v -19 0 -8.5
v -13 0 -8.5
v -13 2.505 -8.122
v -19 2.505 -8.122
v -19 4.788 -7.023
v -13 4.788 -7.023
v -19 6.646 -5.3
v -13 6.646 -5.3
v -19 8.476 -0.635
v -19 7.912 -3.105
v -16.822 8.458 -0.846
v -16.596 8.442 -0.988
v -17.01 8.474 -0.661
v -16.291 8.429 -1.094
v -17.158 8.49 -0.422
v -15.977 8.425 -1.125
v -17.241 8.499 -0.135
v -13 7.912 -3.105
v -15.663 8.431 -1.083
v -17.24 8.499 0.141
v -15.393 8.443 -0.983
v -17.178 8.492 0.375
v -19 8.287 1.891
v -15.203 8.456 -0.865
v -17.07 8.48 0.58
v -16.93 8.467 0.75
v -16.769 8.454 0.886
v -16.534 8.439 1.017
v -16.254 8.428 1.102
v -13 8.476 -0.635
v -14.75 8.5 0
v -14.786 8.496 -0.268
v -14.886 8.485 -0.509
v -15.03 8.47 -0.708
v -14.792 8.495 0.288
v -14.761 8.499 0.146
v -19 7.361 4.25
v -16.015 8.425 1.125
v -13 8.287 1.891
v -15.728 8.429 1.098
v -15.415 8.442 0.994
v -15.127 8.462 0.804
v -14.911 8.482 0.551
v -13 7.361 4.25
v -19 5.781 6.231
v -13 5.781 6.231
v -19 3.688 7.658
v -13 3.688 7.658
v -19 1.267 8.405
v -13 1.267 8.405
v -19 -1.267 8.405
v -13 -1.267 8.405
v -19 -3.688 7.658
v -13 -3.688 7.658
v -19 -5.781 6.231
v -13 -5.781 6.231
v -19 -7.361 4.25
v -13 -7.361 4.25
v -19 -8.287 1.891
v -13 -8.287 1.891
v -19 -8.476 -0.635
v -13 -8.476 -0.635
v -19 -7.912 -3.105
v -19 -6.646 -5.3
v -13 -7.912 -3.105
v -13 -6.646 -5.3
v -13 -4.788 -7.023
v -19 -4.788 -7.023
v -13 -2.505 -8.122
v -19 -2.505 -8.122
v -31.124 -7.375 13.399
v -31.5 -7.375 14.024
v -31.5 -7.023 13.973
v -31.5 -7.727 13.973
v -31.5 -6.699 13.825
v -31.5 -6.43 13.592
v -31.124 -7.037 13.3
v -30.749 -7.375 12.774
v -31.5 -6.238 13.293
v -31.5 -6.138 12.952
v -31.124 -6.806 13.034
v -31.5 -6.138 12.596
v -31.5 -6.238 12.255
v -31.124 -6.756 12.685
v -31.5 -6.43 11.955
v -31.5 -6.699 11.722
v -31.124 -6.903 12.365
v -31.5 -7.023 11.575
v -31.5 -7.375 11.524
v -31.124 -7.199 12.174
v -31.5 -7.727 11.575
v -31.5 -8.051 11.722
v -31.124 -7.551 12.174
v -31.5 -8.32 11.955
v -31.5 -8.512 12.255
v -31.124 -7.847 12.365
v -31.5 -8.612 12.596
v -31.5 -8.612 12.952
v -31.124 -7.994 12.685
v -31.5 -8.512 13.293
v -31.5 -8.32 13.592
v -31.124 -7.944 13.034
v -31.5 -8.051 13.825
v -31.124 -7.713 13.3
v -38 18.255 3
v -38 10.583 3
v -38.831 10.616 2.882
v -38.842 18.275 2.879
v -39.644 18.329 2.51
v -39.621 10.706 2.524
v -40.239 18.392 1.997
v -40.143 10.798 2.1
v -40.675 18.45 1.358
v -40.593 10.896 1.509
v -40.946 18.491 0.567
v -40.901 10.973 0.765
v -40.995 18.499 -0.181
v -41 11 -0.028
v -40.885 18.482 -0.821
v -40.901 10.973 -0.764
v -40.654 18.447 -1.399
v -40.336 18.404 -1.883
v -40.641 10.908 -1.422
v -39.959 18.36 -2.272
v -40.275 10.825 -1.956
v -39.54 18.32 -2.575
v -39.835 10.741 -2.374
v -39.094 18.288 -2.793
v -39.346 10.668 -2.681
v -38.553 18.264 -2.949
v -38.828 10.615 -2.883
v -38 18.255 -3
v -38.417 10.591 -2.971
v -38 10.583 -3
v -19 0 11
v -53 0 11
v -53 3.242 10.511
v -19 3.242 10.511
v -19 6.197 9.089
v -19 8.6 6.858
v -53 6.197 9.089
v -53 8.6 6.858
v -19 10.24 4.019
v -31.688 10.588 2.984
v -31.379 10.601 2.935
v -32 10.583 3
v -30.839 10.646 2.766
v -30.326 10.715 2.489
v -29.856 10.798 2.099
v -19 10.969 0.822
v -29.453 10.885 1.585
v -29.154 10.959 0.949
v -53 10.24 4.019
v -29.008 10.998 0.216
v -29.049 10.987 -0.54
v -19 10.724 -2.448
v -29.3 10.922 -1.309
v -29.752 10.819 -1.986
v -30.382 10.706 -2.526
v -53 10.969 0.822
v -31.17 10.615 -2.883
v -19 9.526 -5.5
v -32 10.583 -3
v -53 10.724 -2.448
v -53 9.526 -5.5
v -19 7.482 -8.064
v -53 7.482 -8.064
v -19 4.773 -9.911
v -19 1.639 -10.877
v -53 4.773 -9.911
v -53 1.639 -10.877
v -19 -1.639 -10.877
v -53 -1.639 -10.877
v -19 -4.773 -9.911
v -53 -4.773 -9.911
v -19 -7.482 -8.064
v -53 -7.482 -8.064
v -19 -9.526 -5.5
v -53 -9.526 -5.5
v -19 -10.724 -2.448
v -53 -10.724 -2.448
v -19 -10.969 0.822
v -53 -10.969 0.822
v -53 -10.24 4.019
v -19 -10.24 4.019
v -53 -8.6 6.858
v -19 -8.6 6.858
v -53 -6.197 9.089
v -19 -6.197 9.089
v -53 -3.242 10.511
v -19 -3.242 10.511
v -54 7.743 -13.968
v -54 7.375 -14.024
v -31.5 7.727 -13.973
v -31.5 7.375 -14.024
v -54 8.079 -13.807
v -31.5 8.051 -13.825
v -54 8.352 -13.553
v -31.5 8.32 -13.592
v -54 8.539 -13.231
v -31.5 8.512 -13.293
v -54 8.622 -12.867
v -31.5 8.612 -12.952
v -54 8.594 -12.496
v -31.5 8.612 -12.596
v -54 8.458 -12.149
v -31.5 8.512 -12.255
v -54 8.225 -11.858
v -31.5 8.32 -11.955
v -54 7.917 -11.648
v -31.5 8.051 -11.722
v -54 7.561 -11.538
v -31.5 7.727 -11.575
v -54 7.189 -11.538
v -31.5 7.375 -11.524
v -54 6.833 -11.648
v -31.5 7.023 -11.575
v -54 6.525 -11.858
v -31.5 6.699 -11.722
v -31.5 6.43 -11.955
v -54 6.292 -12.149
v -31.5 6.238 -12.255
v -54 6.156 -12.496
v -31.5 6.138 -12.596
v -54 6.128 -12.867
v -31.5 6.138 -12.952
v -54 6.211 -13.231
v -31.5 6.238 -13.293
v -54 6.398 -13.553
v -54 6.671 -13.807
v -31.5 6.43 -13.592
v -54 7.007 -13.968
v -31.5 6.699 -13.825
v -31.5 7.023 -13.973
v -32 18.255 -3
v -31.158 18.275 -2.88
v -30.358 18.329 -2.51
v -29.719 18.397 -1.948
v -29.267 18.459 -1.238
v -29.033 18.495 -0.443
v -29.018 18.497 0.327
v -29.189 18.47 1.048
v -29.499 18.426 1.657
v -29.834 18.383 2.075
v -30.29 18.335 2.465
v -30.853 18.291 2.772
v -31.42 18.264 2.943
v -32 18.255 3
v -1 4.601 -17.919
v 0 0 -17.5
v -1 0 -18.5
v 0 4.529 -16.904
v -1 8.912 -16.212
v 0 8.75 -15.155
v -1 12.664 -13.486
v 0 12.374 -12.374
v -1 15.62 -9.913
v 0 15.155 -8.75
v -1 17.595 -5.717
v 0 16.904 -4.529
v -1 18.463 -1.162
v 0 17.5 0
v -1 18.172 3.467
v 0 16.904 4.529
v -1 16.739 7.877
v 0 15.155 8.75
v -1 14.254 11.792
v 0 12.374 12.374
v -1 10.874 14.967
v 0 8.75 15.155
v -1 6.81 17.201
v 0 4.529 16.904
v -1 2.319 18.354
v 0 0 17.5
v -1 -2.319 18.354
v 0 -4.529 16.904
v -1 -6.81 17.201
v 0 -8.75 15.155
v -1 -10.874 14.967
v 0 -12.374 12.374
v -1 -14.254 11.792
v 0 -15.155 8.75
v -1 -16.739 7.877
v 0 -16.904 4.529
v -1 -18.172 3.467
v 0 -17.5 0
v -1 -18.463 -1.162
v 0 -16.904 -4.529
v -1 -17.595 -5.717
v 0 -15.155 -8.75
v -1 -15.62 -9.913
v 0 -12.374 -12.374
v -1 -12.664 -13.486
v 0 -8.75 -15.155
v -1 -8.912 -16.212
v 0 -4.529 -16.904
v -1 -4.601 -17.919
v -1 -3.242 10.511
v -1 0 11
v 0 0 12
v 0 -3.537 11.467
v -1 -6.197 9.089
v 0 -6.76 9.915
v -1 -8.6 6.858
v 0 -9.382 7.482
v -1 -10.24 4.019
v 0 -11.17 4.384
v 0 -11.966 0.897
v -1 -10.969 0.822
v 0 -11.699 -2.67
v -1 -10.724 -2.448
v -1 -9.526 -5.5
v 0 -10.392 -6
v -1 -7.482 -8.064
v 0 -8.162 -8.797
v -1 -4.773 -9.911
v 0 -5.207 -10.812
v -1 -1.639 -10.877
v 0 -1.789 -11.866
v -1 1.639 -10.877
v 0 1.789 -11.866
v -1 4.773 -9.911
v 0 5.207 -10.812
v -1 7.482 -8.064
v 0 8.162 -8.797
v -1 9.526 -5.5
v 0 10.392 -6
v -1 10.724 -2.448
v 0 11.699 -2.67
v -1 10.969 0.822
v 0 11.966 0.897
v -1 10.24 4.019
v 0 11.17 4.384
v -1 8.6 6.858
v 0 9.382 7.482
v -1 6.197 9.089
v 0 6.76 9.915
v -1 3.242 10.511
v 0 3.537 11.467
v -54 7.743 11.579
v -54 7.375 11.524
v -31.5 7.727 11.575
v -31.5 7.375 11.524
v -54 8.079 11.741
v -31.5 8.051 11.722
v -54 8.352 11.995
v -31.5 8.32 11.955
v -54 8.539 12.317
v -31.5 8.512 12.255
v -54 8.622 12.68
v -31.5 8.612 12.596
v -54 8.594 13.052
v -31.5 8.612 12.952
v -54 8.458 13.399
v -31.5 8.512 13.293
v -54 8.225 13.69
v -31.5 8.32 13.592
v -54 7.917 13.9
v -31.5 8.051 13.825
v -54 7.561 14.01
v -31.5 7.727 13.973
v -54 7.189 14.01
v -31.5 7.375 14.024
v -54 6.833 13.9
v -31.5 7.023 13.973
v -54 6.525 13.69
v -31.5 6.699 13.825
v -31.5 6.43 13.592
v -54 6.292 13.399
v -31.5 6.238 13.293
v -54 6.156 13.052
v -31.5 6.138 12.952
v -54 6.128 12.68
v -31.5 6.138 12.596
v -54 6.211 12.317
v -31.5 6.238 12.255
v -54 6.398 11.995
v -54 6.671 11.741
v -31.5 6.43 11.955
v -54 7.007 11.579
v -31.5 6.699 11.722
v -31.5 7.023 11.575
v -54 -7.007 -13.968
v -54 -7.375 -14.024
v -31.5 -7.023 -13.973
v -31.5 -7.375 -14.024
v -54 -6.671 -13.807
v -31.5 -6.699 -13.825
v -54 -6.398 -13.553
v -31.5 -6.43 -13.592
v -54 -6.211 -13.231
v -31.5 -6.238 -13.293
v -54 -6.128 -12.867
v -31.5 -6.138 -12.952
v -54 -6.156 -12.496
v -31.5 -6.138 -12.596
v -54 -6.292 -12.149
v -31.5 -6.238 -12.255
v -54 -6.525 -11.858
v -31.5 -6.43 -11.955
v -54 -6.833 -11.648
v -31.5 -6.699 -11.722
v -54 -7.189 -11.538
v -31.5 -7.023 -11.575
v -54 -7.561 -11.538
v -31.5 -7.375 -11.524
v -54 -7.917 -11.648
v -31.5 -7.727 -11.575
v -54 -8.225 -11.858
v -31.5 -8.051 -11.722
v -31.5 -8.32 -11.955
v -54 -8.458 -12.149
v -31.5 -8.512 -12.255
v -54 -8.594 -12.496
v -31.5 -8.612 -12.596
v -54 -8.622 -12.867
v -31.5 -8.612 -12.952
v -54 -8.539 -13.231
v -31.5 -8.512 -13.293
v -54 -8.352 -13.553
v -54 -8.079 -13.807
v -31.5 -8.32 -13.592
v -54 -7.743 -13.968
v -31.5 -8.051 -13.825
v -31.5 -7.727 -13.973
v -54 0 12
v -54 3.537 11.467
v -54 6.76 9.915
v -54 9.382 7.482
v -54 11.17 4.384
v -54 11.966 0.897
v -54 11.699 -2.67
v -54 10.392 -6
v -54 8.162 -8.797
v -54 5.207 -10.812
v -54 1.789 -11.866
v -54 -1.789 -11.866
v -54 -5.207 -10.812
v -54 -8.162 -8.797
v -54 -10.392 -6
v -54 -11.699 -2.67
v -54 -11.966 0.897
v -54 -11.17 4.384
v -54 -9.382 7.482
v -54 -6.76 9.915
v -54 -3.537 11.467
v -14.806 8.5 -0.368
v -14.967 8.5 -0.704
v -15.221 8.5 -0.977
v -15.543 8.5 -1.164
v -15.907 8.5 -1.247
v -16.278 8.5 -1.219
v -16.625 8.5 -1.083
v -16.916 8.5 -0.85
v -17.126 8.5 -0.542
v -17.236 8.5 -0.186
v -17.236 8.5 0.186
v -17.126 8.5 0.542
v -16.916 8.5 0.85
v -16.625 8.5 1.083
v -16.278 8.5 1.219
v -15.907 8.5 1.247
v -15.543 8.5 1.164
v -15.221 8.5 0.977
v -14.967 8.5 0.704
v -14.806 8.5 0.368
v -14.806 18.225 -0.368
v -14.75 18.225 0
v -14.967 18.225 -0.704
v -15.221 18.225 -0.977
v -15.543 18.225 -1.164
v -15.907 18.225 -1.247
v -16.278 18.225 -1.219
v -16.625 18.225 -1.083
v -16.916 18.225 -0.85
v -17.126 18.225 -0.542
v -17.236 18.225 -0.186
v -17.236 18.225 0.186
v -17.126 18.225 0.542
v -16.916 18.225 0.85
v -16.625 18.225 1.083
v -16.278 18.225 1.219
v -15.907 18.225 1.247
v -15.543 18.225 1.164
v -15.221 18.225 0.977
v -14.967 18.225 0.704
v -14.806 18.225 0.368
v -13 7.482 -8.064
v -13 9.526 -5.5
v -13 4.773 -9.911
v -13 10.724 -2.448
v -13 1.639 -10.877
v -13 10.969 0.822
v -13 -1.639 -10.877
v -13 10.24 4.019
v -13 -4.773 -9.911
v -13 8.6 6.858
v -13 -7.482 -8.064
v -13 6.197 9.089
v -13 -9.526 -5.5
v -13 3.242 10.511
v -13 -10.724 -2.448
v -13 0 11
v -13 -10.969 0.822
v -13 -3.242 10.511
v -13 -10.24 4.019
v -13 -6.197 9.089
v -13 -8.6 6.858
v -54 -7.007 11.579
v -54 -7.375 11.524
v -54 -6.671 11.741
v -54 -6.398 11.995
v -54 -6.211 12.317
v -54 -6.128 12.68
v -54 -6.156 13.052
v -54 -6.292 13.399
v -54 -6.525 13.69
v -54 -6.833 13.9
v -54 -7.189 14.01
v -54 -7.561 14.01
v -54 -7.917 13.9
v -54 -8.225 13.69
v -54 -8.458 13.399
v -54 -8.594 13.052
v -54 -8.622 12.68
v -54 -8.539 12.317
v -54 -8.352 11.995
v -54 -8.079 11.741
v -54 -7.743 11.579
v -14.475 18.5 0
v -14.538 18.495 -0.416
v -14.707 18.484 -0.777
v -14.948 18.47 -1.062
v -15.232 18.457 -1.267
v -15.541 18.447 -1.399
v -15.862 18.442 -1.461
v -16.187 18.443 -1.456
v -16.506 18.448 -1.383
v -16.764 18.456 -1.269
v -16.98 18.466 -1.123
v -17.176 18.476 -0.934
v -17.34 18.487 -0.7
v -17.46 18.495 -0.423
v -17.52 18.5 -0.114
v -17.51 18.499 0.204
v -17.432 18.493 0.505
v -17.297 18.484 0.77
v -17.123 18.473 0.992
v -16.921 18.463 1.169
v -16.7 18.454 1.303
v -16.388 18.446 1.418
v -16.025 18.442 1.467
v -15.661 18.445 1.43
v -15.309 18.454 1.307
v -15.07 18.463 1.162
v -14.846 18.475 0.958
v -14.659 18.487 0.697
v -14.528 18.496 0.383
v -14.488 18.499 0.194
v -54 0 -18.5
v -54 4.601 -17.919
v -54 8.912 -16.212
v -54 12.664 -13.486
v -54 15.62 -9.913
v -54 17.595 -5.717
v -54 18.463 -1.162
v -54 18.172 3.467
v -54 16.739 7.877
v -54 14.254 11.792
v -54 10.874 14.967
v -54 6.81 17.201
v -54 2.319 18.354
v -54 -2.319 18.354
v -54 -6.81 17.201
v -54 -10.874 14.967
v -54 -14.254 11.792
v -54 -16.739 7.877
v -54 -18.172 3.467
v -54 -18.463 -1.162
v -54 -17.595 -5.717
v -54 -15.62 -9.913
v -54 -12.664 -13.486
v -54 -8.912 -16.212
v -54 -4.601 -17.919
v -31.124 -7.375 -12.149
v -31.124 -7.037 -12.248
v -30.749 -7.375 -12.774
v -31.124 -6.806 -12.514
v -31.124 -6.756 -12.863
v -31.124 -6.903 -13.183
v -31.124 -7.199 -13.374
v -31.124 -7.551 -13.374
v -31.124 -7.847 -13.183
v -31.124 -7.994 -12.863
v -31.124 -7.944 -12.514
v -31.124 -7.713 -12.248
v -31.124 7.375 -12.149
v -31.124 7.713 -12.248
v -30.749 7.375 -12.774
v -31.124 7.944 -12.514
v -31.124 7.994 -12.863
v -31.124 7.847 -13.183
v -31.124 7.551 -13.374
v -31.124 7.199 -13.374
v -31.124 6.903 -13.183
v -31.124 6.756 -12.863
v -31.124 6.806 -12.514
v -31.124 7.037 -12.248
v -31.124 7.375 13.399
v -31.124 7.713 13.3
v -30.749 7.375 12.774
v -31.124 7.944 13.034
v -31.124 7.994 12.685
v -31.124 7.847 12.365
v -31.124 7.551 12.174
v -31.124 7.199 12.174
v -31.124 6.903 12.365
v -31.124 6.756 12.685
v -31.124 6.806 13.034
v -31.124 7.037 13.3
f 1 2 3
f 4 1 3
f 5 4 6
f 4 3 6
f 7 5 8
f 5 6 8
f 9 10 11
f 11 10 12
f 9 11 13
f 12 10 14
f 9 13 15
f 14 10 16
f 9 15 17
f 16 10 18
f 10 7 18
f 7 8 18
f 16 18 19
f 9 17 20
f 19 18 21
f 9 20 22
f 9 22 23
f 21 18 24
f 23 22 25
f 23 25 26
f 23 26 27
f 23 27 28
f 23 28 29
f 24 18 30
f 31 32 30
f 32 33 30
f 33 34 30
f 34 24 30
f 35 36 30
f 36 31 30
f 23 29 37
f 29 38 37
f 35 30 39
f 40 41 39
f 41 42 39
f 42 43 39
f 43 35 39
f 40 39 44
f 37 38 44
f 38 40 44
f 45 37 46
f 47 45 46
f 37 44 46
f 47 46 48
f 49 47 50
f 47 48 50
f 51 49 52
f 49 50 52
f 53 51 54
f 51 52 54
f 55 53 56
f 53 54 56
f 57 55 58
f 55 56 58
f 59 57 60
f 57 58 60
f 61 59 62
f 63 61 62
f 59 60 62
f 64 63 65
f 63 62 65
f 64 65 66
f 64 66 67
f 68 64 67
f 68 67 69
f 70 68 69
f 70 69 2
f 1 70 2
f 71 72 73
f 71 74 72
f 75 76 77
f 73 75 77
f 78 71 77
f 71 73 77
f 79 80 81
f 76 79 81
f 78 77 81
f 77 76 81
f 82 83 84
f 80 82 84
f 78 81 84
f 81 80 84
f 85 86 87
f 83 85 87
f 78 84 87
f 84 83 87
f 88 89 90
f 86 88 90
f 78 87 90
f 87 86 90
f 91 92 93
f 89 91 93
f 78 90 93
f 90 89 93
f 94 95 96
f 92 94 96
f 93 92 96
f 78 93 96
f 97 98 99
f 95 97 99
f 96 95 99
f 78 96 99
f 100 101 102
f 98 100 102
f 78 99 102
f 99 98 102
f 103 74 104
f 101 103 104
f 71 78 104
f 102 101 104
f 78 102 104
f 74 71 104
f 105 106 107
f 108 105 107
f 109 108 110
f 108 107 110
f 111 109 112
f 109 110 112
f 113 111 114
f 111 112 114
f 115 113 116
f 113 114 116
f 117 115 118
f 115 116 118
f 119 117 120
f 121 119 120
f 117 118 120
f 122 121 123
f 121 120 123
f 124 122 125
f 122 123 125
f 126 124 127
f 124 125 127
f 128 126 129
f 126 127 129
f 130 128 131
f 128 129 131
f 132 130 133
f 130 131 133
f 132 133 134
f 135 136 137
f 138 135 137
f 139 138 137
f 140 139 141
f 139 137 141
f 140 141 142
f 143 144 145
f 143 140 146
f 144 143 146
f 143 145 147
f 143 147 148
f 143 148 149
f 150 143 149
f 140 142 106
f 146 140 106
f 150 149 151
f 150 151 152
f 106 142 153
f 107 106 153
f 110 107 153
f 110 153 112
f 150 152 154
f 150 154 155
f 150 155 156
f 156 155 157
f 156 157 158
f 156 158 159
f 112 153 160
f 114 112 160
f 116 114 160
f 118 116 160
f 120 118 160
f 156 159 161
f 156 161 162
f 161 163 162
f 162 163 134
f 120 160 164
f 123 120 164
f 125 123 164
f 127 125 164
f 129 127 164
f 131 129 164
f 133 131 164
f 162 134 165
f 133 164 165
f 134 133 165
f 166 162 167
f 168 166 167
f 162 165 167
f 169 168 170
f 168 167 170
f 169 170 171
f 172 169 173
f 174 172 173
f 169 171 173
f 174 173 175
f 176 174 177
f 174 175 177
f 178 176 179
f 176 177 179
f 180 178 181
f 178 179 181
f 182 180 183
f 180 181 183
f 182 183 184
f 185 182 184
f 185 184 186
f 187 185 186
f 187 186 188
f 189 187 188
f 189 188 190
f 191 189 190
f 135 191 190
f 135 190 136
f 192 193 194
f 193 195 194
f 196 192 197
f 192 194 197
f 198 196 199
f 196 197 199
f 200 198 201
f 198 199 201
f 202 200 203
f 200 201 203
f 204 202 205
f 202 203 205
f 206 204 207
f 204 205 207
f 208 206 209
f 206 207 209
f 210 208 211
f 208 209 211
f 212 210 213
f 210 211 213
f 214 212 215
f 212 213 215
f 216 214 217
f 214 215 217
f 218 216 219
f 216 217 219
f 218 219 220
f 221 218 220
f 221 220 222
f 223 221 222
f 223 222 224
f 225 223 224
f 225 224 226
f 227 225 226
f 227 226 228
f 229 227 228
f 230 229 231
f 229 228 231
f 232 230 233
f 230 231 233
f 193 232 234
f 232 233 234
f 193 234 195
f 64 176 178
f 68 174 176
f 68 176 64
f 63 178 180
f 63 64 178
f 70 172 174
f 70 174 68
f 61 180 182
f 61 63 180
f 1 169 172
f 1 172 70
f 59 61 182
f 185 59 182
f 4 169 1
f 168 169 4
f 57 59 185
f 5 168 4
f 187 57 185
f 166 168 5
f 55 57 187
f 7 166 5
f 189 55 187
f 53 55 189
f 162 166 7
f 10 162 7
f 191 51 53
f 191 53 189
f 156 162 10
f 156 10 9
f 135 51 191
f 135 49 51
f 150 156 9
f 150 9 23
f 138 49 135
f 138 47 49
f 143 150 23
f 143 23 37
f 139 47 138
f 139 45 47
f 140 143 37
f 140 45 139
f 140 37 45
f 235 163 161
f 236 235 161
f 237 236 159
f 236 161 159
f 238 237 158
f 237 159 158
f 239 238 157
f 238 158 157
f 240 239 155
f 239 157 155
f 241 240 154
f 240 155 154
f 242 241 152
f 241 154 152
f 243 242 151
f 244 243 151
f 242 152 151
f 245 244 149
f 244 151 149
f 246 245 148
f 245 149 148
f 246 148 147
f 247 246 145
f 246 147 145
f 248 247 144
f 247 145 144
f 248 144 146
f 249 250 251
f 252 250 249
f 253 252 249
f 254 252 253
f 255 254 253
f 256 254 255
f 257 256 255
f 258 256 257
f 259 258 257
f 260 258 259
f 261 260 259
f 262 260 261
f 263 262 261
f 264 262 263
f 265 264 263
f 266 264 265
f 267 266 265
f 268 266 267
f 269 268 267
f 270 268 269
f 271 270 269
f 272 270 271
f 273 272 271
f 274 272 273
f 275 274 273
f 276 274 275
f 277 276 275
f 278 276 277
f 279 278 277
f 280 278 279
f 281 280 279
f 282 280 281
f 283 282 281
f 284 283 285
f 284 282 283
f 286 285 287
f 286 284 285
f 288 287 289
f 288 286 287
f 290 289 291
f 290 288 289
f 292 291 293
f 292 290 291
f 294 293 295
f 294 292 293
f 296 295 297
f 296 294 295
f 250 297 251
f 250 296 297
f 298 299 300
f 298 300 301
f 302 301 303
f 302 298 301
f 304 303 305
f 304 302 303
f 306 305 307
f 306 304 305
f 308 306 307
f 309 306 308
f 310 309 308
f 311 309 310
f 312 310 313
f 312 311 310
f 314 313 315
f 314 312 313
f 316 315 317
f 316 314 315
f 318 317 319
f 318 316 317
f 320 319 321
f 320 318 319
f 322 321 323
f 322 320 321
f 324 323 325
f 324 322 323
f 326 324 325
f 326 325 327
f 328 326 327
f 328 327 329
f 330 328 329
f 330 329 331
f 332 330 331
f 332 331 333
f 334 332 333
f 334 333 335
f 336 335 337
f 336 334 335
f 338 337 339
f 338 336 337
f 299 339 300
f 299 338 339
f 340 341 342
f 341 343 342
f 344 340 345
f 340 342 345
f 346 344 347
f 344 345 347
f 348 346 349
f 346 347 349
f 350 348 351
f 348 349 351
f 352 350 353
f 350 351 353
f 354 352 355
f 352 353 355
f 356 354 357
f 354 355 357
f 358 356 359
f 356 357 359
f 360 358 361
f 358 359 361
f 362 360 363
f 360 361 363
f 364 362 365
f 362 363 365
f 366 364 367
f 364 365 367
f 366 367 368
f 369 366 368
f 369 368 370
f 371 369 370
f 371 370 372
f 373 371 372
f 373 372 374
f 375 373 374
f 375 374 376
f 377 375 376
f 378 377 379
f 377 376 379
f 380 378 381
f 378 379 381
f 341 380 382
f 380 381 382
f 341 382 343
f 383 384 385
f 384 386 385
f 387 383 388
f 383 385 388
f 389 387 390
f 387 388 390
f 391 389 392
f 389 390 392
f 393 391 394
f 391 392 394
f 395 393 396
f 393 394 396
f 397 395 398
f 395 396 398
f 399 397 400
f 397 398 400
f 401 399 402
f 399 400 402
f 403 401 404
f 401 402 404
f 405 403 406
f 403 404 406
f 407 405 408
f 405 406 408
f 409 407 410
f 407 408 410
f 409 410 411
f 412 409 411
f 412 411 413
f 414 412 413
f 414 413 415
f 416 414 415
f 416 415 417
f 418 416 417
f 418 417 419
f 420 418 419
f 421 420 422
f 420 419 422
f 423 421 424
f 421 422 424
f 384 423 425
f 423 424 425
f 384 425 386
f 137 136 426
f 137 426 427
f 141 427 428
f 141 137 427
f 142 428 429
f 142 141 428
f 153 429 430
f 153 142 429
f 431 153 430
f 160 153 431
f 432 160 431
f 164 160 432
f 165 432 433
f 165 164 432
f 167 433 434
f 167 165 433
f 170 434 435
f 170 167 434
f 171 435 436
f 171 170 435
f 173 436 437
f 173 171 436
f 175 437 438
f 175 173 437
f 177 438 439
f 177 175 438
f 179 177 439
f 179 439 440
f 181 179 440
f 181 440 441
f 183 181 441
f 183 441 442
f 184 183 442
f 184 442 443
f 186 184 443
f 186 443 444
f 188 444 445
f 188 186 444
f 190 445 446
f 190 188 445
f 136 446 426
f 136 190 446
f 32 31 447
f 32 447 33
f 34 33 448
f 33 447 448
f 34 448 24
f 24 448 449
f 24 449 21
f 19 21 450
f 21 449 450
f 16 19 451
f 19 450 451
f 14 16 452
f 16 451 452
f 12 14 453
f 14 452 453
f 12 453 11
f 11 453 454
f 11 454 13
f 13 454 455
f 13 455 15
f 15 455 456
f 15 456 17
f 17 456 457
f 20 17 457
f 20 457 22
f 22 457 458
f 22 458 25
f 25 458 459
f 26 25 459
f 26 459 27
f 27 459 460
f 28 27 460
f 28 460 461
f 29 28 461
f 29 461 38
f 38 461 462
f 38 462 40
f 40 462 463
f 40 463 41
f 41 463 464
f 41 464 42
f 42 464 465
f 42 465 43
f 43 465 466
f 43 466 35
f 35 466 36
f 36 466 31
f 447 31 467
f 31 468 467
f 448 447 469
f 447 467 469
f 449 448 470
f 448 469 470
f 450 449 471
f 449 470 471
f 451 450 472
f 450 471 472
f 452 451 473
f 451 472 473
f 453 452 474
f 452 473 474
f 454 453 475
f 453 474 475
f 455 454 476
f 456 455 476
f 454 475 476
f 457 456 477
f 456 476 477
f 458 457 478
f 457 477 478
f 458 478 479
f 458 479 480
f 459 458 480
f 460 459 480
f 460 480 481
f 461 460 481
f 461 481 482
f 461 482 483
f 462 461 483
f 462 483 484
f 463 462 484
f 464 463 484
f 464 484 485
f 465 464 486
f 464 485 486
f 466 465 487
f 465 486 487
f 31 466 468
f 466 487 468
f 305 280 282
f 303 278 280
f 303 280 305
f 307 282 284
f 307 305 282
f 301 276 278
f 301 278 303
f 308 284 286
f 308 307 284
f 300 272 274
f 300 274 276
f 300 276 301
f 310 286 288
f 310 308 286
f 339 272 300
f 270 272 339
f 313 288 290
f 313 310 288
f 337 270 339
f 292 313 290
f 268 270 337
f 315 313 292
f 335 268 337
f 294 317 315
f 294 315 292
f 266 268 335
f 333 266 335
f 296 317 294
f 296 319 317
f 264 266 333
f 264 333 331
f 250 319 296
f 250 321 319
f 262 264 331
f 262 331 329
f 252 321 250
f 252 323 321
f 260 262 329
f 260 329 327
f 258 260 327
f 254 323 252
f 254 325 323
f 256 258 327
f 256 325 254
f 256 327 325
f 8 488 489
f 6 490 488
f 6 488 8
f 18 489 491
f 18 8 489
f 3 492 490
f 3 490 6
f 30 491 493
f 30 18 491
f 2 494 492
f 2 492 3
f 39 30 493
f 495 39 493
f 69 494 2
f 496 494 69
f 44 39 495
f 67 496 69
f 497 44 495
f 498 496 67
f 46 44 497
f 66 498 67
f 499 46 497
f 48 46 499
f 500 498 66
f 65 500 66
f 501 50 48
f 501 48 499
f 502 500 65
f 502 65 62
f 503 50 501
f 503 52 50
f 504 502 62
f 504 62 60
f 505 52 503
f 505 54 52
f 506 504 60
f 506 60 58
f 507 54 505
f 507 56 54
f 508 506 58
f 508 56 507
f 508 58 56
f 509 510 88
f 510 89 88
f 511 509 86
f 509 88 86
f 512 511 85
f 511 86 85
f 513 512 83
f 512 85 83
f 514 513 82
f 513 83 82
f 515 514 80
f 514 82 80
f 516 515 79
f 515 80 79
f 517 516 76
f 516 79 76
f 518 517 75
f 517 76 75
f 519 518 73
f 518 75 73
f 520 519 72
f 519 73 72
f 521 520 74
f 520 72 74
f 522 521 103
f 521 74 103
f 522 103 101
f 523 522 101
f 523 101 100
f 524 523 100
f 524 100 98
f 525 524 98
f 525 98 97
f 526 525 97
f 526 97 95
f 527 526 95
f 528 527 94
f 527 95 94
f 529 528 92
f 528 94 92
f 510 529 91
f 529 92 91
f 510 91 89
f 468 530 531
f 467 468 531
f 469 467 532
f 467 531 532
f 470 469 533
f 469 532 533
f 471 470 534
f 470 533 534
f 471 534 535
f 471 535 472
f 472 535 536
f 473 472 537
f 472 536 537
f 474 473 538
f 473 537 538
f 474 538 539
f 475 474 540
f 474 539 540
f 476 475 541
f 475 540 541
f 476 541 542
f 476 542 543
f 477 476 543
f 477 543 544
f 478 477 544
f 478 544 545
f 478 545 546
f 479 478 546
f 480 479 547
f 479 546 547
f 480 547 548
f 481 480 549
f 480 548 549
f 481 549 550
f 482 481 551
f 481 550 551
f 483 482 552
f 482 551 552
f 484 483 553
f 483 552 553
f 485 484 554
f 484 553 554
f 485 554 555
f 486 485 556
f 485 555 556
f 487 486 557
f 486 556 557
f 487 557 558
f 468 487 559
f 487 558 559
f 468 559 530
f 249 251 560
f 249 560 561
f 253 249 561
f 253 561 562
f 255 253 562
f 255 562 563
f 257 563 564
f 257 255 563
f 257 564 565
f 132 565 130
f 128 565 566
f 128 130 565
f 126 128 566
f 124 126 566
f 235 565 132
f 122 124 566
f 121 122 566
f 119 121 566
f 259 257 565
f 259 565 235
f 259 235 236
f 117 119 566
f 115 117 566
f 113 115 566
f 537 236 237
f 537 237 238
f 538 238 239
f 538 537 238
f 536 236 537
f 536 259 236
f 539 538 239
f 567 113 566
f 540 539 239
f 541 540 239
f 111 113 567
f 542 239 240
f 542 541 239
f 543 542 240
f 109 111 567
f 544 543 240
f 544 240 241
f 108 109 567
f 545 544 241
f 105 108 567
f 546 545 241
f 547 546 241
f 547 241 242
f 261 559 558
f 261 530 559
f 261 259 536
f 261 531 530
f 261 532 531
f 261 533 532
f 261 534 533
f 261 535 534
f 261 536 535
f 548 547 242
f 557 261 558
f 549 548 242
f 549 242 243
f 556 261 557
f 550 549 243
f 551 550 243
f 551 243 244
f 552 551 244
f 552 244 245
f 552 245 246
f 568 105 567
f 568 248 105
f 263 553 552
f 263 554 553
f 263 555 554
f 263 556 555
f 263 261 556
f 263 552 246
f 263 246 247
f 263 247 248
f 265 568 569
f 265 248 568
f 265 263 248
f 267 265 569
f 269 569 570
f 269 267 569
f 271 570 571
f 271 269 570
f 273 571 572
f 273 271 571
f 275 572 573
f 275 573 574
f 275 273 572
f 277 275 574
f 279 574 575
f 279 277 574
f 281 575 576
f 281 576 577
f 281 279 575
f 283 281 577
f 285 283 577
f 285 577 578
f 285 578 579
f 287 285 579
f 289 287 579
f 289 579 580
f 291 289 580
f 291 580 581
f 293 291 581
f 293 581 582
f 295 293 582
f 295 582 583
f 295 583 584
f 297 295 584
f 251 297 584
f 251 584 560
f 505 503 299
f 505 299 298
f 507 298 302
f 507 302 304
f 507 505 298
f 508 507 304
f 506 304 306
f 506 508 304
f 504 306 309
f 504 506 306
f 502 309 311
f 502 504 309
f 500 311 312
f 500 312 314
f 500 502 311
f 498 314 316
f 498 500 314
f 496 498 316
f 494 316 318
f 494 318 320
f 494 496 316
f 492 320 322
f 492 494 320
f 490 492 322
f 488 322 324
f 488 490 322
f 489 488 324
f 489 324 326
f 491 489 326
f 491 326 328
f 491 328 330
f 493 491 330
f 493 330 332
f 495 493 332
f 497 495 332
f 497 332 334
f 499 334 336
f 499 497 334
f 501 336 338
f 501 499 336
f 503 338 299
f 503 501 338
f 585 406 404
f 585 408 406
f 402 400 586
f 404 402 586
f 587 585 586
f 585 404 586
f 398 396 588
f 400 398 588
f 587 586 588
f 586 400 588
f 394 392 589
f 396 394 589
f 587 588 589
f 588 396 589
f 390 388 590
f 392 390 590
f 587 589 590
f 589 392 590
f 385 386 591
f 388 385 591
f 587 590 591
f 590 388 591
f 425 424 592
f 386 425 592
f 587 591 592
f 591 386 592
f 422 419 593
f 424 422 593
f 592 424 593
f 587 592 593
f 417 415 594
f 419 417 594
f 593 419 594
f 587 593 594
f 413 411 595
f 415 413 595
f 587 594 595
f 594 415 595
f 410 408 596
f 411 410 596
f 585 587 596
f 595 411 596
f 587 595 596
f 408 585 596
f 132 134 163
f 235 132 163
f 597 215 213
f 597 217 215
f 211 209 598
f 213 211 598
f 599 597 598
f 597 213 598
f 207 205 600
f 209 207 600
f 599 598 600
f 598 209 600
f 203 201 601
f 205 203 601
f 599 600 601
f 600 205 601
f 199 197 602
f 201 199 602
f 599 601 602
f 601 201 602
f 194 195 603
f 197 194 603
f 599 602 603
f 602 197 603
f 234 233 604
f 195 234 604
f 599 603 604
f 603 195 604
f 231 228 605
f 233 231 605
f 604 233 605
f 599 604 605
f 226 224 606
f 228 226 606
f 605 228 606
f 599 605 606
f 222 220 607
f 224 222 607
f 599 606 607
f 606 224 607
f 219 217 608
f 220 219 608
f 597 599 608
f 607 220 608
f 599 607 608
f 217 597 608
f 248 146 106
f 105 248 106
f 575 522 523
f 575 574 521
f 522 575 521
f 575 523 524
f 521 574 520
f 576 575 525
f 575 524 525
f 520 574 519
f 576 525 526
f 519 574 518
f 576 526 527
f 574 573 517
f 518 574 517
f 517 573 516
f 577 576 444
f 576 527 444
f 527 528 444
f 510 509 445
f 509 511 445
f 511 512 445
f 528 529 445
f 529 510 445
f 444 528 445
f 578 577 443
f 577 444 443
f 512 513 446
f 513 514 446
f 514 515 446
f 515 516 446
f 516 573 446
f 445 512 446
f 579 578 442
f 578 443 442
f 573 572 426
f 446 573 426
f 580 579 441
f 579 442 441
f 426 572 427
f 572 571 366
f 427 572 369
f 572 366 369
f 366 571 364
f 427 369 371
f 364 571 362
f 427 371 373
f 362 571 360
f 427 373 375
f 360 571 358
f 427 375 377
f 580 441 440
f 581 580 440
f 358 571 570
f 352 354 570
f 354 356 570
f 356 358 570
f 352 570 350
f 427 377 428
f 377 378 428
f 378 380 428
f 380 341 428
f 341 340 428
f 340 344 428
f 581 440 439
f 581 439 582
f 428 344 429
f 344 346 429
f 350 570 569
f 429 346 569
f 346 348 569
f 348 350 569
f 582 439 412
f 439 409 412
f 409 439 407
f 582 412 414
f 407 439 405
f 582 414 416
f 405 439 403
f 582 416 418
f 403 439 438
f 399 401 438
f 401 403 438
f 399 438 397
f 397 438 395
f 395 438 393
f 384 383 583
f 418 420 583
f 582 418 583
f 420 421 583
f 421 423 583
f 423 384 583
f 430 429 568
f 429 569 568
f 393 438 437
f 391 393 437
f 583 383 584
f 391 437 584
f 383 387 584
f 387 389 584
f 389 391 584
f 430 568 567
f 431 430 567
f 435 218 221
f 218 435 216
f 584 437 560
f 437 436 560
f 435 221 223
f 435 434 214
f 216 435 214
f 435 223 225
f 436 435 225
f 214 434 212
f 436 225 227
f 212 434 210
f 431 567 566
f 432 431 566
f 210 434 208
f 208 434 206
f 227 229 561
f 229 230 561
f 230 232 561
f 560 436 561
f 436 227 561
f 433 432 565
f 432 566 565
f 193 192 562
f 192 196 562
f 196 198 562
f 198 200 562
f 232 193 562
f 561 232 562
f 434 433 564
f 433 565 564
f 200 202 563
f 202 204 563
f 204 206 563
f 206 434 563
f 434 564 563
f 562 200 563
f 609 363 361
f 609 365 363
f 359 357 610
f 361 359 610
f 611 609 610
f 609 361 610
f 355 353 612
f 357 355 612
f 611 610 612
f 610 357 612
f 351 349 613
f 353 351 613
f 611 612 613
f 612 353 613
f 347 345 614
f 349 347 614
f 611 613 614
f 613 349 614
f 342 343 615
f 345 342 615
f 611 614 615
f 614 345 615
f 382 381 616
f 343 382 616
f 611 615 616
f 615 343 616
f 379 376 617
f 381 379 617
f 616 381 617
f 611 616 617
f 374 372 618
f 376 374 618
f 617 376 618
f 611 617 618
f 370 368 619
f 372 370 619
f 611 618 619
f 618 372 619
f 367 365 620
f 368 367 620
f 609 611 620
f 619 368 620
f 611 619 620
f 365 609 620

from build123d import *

# Parameters (mm, degrees)
SKETCH_1_R            = 18.5
EXTRUDE_312_DEPTH     = 54
SKETCH_2_R            = 8.5
CUT_EXTRUDE_18_DEPTH  = 61.004166522
SKETCH_3_R            = 11
CUT_EXTRUDE_22_DEPTH  = 35
CUT_EXTRUDE_722_DEPTH = 61.004166522
HOLE_WIZARD_M3_D      = 2.5
HOLE_WIZARD_M3_DEPTH  = 22.5
HOLE_WIZARD_M3_TIP    = 0.751075774
CUT_EXTRUDE_START     = -13
SKETCH_10_R           = 11
CUT_EXTRUDE_1_DEPTH   = 13
CHAMFER_1_SIZE        = 1


# Read off the part's stored shape, not the designer's step: Масленка M3
with BuildPart() as part:
    # Эскиз1 → Extrude 312 (new body)
    with BuildSketch(Plane(origin=(0, 0, 0), x_dir=(0, 0, -1), z_dir=(1, 0, 0))):
        Circle(SKETCH_1_R)
    extrude(amount=-EXTRUDE_312_DEPTH)

    # Эскиз2 → Вырез18 (cut, through all)
    with BuildSketch(Plane(origin=(0, 0, 0), x_dir=(0, 0, -1), z_dir=(1, 0, 0))):
        Circle(SKETCH_2_R)
    extrude(amount=-CUT_EXTRUDE_18_DEPTH, mode=Mode.SUBTRACT)

    # Эскиз3 → Вырез22 (cut)
    with BuildSketch(Plane.ZY.offset(54)):
        Circle(SKETCH_3_R)
    extrude(amount=-CUT_EXTRUDE_22_DEPTH, mode=Mode.SUBTRACT)

    # Эскиз4 → Cut-Extrude 722 (cut, through all)
    with BuildSketch(Plane(origin=(0, 0, 0), x_dir=(1, 0, 0), z_dir=(0, 1, 0))):
        with BuildLine():
            Line((-38, 3), (-32, 3))
            ThreePointArc((-32, 3), (-29, 0), (-32, -3))
            Line((-32, -3), (-38, -3))
            ThreePointArc((-38, -3), (-41, 0), (-38, 3))
        make_face()
    extrude(amount=CUT_EXTRUDE_722_DEPTH, mode=Mode.SUBTRACT)

    # Hole Wizard M3
    with Locations(Plane.ZY.offset(54)):
        with Locations((-12.773874706, 7.375), (-12.773874706, -7.375), (12.773874706, 7.375), (12.773874706, -7.375)):
            Hole(HOLE_WIZARD_M3_D / 2, depth=HOLE_WIZARD_M3_DEPTH)
            with Locations((0, 0, -(HOLE_WIZARD_M3_DEPTH + HOLE_WIZARD_M3_TIP / 2))):  # 118° drill point
                Cone(0, HOLE_WIZARD_M3_D / 2, HOLE_WIZARD_M3_TIP, mode=Mode.SUBTRACT)

    # Эскиз10 → Вырез-Вытянуть1 (cut)
    with BuildSketch(Plane(origin=(0, 0, 0), x_dir=(0, 0, -1), z_dir=(1, 0, 0)).offset(CUT_EXTRUDE_START)):
        with Locations(Location((0, 0, 0), (0, 0, 180))):
            Circle(SKETCH_10_R)
    extrude(amount=CUT_EXTRUDE_1_DEPTH, mode=Mode.SUBTRACT)

    # Фаска1
    chamfer_1_edges = [part.edges().sort_by_distance(p)[0] for p in [
        (-54, 0, -11),
        (0, 0, 18.5),
        (0, 0, -11),
    ]]
    chamfer(chamfer_1_edges, length=CHAMFER_1_SIZE)

    # Hole Wizard M3 2 outline → Hole Wizard M3 2 (revolve, cut)
    with BuildSketch(Plane(origin=(-16, 0, 0), x_dir=(1, 0, 0), z_dir=(0, 0, 1))):
        Polygon((1.12540101, 18.500010757), (1.12540101, 8.425110656), (1.250001052, 8.500000632), (1.25, 18.225), (1.25, 18.500010757), align=None)
        Polygon((0, 8.425110656), (1.125382105, 8.425110656), (1.12540101, 18.500010757), (0, 18.500010757), align=None)
        Polygon((1.25, 18.500010757), (1.25, 18.225), (1.525010757, 18.500010757), align=None)
    revolve(axis=Axis((-16, 0, 0), (0, 1, 0)), mode=Mode.SUBTRACT)


solid = part.part
